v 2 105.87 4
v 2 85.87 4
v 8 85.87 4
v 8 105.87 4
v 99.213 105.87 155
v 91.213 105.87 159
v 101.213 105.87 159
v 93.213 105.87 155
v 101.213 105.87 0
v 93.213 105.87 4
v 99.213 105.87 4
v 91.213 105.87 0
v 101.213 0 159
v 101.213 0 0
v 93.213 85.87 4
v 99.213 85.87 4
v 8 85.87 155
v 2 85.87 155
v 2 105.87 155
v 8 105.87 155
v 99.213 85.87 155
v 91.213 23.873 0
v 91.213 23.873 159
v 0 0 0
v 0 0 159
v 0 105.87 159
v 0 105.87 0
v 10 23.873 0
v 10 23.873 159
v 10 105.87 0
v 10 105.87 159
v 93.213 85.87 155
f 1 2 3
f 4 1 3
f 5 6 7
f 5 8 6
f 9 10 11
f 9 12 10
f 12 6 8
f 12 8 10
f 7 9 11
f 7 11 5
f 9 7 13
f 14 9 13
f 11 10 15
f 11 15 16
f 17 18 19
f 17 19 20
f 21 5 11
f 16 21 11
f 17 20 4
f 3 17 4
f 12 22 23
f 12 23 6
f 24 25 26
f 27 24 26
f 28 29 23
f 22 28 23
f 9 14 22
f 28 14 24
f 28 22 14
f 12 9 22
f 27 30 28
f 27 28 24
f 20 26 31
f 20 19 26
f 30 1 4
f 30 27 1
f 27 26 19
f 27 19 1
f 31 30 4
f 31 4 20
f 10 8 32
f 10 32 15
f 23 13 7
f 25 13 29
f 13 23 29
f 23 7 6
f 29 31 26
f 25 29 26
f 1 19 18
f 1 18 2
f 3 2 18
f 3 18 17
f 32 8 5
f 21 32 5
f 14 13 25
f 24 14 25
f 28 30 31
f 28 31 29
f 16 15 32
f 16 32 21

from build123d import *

# Parameters (mm, degrees)
BOSS_EXTRUDE2_DEPTH = 159
SKETCH4_W           = 6
SKETCH4_H           = 151
CUT_EXTRUDE1_DEPTH  = 20


with BuildPart() as part:
    # Sketch3 → Boss-Extrude2 (new body)
    with BuildSketch(Plane.XY):
        Polygon((0, 0), (0, 105.870341046), (10, 105.870341046), (10, 23.872751767), (91.212923353, 23.872751767), (91.212923353, 105.870341046), (101.212923353, 105.870341046), (101.212923353, 0), align=None)
    extrude(amount=BOSS_EXTRUDE2_DEPTH)

    # Sketch4 → Cut-Extrude1 (cut)
    with BuildSketch(Plane(origin=(0, 105.870341046, 0), x_dir=(1, 0, 0), z_dir=(0, 1, 0))):
        with Locations((5, -79.5)):
            Rectangle(SKETCH4_W, SKETCH4_H)
        with Locations((96.212923353, -79.5)):
            Rectangle(SKETCH4_W, SKETCH4_H)
    extrude(amount=-CUT_EXTRUDE1_DEPTH, mode=Mode.SUBTRACT)


solid = part.part
